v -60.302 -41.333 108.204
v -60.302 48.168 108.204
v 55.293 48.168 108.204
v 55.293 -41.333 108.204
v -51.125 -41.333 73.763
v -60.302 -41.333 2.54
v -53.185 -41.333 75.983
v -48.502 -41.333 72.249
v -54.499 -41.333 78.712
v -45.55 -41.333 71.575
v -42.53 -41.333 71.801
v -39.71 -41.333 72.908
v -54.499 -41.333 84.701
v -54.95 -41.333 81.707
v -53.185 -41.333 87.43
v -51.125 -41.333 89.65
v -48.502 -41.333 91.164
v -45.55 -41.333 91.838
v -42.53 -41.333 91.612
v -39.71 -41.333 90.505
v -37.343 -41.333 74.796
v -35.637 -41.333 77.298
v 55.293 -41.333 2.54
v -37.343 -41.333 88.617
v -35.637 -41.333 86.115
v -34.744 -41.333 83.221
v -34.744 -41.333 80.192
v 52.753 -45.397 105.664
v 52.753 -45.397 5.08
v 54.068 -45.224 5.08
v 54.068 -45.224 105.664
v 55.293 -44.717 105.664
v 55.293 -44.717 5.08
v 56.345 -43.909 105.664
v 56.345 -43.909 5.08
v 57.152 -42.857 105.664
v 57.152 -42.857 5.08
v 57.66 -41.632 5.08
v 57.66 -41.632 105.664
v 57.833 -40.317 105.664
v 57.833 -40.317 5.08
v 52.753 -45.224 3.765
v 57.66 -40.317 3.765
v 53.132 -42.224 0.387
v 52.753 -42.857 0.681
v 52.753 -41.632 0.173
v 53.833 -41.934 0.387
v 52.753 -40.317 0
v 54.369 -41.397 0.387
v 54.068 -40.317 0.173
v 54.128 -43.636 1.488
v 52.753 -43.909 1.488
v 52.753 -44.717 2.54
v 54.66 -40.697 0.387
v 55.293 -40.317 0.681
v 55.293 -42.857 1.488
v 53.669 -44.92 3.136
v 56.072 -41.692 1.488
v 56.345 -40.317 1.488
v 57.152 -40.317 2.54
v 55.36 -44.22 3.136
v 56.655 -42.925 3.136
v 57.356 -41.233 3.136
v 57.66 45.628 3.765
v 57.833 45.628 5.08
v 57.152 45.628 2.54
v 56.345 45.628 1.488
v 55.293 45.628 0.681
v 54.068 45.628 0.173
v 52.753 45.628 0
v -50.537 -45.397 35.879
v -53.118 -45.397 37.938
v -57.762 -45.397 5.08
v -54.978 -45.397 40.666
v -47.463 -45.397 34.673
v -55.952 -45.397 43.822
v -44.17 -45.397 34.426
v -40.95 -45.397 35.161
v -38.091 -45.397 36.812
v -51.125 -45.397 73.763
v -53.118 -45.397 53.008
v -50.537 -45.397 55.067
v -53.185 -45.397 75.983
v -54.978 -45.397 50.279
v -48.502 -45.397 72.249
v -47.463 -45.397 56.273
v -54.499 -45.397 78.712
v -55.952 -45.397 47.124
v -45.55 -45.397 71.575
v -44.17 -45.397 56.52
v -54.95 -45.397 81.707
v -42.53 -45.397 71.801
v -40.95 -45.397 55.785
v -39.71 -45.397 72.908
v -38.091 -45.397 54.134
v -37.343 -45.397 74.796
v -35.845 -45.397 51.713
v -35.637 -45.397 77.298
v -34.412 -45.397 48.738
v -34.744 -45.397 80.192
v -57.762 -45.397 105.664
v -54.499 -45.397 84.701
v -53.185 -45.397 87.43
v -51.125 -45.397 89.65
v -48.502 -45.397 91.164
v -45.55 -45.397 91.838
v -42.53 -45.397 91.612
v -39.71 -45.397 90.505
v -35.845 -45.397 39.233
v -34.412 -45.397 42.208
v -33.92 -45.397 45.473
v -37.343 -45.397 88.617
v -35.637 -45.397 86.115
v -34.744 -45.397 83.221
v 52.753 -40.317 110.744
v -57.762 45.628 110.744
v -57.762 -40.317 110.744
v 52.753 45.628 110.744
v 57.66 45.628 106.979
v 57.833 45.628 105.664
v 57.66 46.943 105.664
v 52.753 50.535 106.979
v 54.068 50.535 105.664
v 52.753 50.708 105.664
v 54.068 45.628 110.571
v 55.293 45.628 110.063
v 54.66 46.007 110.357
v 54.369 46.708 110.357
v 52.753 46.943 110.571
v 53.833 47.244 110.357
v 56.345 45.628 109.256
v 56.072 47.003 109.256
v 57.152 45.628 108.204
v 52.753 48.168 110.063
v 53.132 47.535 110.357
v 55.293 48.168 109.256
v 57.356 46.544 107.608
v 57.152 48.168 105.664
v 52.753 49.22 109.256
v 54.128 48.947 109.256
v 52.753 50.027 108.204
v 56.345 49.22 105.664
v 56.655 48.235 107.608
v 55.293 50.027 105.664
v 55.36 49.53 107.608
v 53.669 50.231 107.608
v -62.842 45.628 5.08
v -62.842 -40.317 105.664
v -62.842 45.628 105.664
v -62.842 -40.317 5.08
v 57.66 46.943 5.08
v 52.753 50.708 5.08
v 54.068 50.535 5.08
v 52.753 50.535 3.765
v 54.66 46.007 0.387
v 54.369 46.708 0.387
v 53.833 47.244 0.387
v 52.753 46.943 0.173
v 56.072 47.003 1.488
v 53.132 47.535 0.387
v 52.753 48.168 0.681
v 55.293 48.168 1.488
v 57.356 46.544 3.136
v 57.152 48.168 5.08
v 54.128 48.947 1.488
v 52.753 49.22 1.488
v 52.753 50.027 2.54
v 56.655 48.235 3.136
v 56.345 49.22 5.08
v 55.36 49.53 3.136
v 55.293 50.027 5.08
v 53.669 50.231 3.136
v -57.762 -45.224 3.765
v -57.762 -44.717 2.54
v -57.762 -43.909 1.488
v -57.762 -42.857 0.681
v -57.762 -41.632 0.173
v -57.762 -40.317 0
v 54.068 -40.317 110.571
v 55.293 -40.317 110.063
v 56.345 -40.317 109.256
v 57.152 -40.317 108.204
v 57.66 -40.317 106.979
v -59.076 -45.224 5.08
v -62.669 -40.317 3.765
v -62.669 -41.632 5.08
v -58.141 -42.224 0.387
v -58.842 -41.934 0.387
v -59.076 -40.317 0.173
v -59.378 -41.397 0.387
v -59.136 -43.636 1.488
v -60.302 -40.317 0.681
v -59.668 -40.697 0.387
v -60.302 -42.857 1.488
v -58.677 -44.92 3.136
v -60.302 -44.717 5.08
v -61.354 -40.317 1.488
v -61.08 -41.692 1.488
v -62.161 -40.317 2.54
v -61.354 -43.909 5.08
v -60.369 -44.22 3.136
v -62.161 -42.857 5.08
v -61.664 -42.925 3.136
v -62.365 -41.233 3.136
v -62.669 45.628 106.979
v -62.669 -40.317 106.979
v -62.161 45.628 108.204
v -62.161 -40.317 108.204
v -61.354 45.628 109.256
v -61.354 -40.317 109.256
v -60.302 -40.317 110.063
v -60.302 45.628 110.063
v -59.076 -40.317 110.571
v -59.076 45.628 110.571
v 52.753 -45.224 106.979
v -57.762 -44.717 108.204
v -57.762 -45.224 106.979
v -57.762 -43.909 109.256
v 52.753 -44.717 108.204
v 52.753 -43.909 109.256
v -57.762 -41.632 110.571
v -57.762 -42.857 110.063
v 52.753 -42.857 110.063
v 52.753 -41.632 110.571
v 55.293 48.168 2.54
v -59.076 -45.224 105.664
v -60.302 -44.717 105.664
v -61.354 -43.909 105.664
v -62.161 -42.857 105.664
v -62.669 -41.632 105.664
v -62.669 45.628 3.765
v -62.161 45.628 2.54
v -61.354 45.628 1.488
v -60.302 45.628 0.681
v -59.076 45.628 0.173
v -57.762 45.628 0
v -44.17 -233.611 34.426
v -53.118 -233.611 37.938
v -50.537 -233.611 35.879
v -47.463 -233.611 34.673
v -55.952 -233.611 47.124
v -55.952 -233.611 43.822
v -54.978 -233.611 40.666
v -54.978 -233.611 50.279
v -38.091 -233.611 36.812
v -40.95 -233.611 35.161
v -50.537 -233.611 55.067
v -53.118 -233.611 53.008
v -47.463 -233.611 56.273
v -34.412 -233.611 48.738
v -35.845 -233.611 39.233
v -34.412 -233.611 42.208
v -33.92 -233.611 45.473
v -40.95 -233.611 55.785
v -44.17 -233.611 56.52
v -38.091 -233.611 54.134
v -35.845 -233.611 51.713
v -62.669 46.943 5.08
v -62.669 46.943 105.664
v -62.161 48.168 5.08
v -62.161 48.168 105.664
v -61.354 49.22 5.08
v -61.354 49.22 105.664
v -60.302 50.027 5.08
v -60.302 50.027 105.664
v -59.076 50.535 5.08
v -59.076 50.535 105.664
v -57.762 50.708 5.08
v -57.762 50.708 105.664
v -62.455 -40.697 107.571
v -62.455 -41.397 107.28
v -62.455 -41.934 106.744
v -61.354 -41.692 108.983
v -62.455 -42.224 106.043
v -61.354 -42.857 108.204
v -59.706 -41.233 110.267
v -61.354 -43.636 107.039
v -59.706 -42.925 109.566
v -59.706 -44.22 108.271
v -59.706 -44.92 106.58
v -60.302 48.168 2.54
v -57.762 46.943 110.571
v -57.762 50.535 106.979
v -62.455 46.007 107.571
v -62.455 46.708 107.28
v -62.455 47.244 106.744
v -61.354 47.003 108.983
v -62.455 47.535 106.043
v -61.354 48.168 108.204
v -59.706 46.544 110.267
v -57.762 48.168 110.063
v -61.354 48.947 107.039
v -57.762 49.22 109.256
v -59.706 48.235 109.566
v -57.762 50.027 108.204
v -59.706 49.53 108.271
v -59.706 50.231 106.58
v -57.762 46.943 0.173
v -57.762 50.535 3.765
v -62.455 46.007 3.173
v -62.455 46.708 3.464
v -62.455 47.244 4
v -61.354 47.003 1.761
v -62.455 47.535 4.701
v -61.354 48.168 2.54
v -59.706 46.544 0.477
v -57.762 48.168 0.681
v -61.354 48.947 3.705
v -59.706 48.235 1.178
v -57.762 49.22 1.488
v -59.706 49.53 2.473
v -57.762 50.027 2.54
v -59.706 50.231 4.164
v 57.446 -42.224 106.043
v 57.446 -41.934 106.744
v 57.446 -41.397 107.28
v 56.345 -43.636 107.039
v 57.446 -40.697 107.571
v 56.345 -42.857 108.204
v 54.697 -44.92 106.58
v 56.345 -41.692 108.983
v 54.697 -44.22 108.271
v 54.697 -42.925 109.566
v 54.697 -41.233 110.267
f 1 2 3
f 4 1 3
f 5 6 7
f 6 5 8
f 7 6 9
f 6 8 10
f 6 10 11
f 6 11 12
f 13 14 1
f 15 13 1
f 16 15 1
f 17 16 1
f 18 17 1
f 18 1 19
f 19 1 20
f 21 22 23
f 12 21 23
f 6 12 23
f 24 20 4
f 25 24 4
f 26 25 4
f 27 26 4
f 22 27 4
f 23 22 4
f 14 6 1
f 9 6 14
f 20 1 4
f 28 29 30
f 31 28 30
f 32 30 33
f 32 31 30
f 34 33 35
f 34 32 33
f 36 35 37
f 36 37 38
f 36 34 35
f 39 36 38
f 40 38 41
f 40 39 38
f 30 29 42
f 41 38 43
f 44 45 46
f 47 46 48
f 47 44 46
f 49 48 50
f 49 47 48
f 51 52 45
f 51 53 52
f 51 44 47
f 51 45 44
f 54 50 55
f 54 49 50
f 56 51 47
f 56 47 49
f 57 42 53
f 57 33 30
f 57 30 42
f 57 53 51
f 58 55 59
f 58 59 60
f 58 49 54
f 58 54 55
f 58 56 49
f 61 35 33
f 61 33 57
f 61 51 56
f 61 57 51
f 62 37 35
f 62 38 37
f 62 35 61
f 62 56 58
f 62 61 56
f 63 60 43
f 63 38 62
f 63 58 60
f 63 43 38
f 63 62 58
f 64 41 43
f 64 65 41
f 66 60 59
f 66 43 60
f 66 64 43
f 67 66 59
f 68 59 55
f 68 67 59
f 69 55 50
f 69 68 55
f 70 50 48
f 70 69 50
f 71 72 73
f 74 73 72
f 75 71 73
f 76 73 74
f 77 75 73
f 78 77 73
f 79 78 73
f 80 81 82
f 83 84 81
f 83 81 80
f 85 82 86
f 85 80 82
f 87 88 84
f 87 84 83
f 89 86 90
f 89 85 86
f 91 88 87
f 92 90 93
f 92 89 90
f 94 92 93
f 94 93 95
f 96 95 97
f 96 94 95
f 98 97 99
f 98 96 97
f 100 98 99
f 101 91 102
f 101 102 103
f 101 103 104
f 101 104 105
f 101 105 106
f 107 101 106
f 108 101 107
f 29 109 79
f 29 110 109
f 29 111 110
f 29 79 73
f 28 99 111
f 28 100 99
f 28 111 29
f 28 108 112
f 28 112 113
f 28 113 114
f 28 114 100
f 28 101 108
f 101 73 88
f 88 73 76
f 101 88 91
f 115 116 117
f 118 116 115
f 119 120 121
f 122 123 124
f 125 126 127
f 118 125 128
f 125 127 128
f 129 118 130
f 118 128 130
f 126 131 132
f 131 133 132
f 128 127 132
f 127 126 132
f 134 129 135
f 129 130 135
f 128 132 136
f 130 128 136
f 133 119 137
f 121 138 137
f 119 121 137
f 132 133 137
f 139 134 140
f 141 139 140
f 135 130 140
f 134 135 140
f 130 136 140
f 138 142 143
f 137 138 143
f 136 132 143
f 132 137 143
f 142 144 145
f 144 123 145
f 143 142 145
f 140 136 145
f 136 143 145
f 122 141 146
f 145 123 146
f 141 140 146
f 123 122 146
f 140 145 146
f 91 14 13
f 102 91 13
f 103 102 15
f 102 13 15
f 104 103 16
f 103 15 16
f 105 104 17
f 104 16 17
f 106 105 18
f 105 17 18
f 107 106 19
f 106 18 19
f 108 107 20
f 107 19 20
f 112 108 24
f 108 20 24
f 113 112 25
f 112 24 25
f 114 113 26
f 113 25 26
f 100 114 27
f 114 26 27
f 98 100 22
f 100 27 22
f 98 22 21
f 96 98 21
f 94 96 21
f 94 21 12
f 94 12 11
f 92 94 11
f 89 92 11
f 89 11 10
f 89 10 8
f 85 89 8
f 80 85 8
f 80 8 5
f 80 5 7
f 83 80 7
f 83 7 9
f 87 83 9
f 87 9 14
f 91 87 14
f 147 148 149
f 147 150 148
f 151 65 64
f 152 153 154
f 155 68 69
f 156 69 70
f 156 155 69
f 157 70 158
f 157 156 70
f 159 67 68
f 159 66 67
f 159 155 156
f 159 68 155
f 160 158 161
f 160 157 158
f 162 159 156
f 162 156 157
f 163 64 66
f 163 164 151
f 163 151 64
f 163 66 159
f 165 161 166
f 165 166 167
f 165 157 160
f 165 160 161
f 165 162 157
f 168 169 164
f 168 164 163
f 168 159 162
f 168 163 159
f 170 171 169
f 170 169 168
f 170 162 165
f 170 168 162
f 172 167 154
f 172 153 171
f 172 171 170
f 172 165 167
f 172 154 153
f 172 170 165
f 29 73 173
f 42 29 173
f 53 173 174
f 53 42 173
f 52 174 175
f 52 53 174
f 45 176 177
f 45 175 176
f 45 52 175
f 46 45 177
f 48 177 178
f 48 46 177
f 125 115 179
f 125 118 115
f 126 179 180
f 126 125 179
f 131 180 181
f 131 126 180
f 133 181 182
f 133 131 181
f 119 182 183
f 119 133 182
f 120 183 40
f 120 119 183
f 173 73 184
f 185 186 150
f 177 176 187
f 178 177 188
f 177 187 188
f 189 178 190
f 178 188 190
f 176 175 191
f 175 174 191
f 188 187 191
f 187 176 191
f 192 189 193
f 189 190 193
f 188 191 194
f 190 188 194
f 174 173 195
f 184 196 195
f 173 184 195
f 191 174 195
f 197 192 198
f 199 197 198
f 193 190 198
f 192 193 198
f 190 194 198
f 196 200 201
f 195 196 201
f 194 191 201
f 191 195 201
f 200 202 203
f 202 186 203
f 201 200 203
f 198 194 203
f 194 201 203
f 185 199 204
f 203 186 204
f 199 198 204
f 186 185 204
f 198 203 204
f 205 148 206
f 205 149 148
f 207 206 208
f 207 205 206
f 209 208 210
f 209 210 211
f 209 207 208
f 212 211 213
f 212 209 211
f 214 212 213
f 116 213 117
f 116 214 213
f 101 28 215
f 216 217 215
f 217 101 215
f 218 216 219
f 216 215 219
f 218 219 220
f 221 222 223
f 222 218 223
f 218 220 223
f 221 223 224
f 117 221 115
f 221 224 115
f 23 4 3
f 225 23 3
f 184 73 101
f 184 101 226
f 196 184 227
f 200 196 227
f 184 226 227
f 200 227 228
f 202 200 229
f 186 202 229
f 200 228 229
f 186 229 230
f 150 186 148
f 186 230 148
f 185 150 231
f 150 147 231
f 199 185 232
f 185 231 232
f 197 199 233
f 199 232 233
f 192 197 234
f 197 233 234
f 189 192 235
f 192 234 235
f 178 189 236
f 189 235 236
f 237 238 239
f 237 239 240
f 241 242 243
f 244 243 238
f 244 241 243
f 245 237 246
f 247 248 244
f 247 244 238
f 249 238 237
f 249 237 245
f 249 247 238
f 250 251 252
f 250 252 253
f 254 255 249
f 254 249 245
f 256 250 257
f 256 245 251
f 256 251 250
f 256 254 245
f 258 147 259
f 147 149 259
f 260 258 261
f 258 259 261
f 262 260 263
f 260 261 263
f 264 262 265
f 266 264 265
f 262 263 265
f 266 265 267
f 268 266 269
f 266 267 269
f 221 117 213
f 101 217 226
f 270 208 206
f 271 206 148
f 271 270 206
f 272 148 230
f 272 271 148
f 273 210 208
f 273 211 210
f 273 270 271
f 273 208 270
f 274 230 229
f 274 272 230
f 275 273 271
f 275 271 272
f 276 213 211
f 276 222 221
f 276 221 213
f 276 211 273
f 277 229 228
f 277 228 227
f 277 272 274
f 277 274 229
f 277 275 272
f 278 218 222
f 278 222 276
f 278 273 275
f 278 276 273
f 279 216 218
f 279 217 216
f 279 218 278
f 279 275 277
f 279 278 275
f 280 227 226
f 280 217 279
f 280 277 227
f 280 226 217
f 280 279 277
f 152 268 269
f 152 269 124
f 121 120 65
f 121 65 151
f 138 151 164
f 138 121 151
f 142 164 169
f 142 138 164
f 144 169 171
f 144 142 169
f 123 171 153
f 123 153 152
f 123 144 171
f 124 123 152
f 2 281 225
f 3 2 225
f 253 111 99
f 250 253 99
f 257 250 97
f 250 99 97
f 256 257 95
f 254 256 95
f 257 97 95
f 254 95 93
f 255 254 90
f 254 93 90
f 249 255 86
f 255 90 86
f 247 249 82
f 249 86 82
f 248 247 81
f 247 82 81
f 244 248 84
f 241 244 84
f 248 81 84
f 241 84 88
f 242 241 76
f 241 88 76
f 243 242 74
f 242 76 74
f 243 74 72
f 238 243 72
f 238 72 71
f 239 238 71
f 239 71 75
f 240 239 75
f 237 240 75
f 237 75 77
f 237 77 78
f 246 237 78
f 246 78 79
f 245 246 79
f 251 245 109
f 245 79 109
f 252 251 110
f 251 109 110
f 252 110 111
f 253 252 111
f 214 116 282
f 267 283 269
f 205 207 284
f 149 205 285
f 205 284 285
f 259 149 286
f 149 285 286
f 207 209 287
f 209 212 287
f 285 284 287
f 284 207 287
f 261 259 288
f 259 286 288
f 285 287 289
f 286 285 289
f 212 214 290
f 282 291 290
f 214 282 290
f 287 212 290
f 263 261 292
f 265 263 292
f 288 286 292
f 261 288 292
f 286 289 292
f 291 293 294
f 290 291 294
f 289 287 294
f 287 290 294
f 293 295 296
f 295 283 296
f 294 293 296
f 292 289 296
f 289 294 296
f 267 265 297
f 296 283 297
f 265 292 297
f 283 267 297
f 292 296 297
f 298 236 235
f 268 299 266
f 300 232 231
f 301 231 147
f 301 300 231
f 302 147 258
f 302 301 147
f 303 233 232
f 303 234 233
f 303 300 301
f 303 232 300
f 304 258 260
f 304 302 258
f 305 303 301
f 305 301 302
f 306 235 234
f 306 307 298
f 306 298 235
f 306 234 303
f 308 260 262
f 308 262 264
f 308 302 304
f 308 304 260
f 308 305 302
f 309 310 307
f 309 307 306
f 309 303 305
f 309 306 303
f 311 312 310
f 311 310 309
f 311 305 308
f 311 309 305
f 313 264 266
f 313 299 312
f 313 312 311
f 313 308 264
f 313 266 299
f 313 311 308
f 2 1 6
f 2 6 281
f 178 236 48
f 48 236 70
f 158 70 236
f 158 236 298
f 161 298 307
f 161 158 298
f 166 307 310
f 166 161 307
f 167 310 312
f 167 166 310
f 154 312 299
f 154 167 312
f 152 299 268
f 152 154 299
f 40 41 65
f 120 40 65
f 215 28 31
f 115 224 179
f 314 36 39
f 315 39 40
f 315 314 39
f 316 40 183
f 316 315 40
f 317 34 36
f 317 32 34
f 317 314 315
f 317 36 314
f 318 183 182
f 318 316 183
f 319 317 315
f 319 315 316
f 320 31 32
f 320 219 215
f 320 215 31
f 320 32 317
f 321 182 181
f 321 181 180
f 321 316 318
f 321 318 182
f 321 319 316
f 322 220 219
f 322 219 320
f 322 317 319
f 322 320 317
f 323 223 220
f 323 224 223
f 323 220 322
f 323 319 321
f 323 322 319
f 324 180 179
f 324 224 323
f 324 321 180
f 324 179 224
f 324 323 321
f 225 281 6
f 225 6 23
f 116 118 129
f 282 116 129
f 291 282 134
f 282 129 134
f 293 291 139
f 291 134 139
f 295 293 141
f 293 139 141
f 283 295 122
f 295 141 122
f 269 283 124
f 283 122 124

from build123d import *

# Parameters (mm, degrees)
F0_W     = 120.674577
F0_H     = 96.105173
F1_DEPTH = 110.744
F2_T     = -2.54
F3_W     = 115.594577
F3_H     = 105.664
F4_DEPTH = 4.064
F6_D     = 20.32
F6_DEPTH = 5.08
F7_R     = 11.07788
F8_DEPTH = 188.214
F9_R     = 5.08


with BuildPart() as f1:
    # F0 (on Top) → F1 (new body)
    with BuildSketch(Plane.XY):
        with Locations((-2.504403, 2.655324)):
            Rectangle(F0_W, F0_H)
    extrude(amount=F1_DEPTH)

    # F2
    f2_openings = [f1.faces().sort_by_distance(p)[0] for p in [
        (-2.504403, -45.397263, 55.372),
    ]]
    offset(amount=F2_T, openings=f2_openings)

    # F3 (on face) → F4 (join)
    with BuildSketch(Plane.XZ.offset(45.397263)):
        with Locations((-2.504403, 55.372)):
            Rectangle(F3_W, F3_H)
    extrude(amount=-F4_DEPTH)

    # F6
    with Locations(Plane.XZ.offset(45.397263)):
        with Locations((-44.790465, 81.706673)):
            Hole(F6_D / 2, depth=F6_DEPTH)

    # F7 (on face) → F8 (join)
    with BuildSketch(Plane.XZ.offset(45.397263)):
        with Locations((-44.997666, 45.472905)):
            Circle(F7_R)
    extrude(amount=F8_DEPTH)

    # F9
    f9_edges = [f1.edges().sort_by_distance(p)[0] for p in [
        (-2.504403, -45.397263, 110.744),
        (57.832886, -45.397263, 55.372),
        (57.832886, 50.70791, 55.372),
        (57.832886, 2.655324, 110.744),
        (-2.504403, 50.70791, 110.744),
        (-62.841691, 2.655324, 110.744),
        (-62.841691, -45.397263, 55.372),
        (-2.504403, -45.397263, 0),
        (57.832886, 2.655324, 0),
        (-2.504403, 50.70791, 0),
        (-62.841691, 2.655324, 0),
        (-62.841691, 50.70791, 55.372),
    ]]
    fillet(f9_edges, radius=F9_R)


solid = f1.part
